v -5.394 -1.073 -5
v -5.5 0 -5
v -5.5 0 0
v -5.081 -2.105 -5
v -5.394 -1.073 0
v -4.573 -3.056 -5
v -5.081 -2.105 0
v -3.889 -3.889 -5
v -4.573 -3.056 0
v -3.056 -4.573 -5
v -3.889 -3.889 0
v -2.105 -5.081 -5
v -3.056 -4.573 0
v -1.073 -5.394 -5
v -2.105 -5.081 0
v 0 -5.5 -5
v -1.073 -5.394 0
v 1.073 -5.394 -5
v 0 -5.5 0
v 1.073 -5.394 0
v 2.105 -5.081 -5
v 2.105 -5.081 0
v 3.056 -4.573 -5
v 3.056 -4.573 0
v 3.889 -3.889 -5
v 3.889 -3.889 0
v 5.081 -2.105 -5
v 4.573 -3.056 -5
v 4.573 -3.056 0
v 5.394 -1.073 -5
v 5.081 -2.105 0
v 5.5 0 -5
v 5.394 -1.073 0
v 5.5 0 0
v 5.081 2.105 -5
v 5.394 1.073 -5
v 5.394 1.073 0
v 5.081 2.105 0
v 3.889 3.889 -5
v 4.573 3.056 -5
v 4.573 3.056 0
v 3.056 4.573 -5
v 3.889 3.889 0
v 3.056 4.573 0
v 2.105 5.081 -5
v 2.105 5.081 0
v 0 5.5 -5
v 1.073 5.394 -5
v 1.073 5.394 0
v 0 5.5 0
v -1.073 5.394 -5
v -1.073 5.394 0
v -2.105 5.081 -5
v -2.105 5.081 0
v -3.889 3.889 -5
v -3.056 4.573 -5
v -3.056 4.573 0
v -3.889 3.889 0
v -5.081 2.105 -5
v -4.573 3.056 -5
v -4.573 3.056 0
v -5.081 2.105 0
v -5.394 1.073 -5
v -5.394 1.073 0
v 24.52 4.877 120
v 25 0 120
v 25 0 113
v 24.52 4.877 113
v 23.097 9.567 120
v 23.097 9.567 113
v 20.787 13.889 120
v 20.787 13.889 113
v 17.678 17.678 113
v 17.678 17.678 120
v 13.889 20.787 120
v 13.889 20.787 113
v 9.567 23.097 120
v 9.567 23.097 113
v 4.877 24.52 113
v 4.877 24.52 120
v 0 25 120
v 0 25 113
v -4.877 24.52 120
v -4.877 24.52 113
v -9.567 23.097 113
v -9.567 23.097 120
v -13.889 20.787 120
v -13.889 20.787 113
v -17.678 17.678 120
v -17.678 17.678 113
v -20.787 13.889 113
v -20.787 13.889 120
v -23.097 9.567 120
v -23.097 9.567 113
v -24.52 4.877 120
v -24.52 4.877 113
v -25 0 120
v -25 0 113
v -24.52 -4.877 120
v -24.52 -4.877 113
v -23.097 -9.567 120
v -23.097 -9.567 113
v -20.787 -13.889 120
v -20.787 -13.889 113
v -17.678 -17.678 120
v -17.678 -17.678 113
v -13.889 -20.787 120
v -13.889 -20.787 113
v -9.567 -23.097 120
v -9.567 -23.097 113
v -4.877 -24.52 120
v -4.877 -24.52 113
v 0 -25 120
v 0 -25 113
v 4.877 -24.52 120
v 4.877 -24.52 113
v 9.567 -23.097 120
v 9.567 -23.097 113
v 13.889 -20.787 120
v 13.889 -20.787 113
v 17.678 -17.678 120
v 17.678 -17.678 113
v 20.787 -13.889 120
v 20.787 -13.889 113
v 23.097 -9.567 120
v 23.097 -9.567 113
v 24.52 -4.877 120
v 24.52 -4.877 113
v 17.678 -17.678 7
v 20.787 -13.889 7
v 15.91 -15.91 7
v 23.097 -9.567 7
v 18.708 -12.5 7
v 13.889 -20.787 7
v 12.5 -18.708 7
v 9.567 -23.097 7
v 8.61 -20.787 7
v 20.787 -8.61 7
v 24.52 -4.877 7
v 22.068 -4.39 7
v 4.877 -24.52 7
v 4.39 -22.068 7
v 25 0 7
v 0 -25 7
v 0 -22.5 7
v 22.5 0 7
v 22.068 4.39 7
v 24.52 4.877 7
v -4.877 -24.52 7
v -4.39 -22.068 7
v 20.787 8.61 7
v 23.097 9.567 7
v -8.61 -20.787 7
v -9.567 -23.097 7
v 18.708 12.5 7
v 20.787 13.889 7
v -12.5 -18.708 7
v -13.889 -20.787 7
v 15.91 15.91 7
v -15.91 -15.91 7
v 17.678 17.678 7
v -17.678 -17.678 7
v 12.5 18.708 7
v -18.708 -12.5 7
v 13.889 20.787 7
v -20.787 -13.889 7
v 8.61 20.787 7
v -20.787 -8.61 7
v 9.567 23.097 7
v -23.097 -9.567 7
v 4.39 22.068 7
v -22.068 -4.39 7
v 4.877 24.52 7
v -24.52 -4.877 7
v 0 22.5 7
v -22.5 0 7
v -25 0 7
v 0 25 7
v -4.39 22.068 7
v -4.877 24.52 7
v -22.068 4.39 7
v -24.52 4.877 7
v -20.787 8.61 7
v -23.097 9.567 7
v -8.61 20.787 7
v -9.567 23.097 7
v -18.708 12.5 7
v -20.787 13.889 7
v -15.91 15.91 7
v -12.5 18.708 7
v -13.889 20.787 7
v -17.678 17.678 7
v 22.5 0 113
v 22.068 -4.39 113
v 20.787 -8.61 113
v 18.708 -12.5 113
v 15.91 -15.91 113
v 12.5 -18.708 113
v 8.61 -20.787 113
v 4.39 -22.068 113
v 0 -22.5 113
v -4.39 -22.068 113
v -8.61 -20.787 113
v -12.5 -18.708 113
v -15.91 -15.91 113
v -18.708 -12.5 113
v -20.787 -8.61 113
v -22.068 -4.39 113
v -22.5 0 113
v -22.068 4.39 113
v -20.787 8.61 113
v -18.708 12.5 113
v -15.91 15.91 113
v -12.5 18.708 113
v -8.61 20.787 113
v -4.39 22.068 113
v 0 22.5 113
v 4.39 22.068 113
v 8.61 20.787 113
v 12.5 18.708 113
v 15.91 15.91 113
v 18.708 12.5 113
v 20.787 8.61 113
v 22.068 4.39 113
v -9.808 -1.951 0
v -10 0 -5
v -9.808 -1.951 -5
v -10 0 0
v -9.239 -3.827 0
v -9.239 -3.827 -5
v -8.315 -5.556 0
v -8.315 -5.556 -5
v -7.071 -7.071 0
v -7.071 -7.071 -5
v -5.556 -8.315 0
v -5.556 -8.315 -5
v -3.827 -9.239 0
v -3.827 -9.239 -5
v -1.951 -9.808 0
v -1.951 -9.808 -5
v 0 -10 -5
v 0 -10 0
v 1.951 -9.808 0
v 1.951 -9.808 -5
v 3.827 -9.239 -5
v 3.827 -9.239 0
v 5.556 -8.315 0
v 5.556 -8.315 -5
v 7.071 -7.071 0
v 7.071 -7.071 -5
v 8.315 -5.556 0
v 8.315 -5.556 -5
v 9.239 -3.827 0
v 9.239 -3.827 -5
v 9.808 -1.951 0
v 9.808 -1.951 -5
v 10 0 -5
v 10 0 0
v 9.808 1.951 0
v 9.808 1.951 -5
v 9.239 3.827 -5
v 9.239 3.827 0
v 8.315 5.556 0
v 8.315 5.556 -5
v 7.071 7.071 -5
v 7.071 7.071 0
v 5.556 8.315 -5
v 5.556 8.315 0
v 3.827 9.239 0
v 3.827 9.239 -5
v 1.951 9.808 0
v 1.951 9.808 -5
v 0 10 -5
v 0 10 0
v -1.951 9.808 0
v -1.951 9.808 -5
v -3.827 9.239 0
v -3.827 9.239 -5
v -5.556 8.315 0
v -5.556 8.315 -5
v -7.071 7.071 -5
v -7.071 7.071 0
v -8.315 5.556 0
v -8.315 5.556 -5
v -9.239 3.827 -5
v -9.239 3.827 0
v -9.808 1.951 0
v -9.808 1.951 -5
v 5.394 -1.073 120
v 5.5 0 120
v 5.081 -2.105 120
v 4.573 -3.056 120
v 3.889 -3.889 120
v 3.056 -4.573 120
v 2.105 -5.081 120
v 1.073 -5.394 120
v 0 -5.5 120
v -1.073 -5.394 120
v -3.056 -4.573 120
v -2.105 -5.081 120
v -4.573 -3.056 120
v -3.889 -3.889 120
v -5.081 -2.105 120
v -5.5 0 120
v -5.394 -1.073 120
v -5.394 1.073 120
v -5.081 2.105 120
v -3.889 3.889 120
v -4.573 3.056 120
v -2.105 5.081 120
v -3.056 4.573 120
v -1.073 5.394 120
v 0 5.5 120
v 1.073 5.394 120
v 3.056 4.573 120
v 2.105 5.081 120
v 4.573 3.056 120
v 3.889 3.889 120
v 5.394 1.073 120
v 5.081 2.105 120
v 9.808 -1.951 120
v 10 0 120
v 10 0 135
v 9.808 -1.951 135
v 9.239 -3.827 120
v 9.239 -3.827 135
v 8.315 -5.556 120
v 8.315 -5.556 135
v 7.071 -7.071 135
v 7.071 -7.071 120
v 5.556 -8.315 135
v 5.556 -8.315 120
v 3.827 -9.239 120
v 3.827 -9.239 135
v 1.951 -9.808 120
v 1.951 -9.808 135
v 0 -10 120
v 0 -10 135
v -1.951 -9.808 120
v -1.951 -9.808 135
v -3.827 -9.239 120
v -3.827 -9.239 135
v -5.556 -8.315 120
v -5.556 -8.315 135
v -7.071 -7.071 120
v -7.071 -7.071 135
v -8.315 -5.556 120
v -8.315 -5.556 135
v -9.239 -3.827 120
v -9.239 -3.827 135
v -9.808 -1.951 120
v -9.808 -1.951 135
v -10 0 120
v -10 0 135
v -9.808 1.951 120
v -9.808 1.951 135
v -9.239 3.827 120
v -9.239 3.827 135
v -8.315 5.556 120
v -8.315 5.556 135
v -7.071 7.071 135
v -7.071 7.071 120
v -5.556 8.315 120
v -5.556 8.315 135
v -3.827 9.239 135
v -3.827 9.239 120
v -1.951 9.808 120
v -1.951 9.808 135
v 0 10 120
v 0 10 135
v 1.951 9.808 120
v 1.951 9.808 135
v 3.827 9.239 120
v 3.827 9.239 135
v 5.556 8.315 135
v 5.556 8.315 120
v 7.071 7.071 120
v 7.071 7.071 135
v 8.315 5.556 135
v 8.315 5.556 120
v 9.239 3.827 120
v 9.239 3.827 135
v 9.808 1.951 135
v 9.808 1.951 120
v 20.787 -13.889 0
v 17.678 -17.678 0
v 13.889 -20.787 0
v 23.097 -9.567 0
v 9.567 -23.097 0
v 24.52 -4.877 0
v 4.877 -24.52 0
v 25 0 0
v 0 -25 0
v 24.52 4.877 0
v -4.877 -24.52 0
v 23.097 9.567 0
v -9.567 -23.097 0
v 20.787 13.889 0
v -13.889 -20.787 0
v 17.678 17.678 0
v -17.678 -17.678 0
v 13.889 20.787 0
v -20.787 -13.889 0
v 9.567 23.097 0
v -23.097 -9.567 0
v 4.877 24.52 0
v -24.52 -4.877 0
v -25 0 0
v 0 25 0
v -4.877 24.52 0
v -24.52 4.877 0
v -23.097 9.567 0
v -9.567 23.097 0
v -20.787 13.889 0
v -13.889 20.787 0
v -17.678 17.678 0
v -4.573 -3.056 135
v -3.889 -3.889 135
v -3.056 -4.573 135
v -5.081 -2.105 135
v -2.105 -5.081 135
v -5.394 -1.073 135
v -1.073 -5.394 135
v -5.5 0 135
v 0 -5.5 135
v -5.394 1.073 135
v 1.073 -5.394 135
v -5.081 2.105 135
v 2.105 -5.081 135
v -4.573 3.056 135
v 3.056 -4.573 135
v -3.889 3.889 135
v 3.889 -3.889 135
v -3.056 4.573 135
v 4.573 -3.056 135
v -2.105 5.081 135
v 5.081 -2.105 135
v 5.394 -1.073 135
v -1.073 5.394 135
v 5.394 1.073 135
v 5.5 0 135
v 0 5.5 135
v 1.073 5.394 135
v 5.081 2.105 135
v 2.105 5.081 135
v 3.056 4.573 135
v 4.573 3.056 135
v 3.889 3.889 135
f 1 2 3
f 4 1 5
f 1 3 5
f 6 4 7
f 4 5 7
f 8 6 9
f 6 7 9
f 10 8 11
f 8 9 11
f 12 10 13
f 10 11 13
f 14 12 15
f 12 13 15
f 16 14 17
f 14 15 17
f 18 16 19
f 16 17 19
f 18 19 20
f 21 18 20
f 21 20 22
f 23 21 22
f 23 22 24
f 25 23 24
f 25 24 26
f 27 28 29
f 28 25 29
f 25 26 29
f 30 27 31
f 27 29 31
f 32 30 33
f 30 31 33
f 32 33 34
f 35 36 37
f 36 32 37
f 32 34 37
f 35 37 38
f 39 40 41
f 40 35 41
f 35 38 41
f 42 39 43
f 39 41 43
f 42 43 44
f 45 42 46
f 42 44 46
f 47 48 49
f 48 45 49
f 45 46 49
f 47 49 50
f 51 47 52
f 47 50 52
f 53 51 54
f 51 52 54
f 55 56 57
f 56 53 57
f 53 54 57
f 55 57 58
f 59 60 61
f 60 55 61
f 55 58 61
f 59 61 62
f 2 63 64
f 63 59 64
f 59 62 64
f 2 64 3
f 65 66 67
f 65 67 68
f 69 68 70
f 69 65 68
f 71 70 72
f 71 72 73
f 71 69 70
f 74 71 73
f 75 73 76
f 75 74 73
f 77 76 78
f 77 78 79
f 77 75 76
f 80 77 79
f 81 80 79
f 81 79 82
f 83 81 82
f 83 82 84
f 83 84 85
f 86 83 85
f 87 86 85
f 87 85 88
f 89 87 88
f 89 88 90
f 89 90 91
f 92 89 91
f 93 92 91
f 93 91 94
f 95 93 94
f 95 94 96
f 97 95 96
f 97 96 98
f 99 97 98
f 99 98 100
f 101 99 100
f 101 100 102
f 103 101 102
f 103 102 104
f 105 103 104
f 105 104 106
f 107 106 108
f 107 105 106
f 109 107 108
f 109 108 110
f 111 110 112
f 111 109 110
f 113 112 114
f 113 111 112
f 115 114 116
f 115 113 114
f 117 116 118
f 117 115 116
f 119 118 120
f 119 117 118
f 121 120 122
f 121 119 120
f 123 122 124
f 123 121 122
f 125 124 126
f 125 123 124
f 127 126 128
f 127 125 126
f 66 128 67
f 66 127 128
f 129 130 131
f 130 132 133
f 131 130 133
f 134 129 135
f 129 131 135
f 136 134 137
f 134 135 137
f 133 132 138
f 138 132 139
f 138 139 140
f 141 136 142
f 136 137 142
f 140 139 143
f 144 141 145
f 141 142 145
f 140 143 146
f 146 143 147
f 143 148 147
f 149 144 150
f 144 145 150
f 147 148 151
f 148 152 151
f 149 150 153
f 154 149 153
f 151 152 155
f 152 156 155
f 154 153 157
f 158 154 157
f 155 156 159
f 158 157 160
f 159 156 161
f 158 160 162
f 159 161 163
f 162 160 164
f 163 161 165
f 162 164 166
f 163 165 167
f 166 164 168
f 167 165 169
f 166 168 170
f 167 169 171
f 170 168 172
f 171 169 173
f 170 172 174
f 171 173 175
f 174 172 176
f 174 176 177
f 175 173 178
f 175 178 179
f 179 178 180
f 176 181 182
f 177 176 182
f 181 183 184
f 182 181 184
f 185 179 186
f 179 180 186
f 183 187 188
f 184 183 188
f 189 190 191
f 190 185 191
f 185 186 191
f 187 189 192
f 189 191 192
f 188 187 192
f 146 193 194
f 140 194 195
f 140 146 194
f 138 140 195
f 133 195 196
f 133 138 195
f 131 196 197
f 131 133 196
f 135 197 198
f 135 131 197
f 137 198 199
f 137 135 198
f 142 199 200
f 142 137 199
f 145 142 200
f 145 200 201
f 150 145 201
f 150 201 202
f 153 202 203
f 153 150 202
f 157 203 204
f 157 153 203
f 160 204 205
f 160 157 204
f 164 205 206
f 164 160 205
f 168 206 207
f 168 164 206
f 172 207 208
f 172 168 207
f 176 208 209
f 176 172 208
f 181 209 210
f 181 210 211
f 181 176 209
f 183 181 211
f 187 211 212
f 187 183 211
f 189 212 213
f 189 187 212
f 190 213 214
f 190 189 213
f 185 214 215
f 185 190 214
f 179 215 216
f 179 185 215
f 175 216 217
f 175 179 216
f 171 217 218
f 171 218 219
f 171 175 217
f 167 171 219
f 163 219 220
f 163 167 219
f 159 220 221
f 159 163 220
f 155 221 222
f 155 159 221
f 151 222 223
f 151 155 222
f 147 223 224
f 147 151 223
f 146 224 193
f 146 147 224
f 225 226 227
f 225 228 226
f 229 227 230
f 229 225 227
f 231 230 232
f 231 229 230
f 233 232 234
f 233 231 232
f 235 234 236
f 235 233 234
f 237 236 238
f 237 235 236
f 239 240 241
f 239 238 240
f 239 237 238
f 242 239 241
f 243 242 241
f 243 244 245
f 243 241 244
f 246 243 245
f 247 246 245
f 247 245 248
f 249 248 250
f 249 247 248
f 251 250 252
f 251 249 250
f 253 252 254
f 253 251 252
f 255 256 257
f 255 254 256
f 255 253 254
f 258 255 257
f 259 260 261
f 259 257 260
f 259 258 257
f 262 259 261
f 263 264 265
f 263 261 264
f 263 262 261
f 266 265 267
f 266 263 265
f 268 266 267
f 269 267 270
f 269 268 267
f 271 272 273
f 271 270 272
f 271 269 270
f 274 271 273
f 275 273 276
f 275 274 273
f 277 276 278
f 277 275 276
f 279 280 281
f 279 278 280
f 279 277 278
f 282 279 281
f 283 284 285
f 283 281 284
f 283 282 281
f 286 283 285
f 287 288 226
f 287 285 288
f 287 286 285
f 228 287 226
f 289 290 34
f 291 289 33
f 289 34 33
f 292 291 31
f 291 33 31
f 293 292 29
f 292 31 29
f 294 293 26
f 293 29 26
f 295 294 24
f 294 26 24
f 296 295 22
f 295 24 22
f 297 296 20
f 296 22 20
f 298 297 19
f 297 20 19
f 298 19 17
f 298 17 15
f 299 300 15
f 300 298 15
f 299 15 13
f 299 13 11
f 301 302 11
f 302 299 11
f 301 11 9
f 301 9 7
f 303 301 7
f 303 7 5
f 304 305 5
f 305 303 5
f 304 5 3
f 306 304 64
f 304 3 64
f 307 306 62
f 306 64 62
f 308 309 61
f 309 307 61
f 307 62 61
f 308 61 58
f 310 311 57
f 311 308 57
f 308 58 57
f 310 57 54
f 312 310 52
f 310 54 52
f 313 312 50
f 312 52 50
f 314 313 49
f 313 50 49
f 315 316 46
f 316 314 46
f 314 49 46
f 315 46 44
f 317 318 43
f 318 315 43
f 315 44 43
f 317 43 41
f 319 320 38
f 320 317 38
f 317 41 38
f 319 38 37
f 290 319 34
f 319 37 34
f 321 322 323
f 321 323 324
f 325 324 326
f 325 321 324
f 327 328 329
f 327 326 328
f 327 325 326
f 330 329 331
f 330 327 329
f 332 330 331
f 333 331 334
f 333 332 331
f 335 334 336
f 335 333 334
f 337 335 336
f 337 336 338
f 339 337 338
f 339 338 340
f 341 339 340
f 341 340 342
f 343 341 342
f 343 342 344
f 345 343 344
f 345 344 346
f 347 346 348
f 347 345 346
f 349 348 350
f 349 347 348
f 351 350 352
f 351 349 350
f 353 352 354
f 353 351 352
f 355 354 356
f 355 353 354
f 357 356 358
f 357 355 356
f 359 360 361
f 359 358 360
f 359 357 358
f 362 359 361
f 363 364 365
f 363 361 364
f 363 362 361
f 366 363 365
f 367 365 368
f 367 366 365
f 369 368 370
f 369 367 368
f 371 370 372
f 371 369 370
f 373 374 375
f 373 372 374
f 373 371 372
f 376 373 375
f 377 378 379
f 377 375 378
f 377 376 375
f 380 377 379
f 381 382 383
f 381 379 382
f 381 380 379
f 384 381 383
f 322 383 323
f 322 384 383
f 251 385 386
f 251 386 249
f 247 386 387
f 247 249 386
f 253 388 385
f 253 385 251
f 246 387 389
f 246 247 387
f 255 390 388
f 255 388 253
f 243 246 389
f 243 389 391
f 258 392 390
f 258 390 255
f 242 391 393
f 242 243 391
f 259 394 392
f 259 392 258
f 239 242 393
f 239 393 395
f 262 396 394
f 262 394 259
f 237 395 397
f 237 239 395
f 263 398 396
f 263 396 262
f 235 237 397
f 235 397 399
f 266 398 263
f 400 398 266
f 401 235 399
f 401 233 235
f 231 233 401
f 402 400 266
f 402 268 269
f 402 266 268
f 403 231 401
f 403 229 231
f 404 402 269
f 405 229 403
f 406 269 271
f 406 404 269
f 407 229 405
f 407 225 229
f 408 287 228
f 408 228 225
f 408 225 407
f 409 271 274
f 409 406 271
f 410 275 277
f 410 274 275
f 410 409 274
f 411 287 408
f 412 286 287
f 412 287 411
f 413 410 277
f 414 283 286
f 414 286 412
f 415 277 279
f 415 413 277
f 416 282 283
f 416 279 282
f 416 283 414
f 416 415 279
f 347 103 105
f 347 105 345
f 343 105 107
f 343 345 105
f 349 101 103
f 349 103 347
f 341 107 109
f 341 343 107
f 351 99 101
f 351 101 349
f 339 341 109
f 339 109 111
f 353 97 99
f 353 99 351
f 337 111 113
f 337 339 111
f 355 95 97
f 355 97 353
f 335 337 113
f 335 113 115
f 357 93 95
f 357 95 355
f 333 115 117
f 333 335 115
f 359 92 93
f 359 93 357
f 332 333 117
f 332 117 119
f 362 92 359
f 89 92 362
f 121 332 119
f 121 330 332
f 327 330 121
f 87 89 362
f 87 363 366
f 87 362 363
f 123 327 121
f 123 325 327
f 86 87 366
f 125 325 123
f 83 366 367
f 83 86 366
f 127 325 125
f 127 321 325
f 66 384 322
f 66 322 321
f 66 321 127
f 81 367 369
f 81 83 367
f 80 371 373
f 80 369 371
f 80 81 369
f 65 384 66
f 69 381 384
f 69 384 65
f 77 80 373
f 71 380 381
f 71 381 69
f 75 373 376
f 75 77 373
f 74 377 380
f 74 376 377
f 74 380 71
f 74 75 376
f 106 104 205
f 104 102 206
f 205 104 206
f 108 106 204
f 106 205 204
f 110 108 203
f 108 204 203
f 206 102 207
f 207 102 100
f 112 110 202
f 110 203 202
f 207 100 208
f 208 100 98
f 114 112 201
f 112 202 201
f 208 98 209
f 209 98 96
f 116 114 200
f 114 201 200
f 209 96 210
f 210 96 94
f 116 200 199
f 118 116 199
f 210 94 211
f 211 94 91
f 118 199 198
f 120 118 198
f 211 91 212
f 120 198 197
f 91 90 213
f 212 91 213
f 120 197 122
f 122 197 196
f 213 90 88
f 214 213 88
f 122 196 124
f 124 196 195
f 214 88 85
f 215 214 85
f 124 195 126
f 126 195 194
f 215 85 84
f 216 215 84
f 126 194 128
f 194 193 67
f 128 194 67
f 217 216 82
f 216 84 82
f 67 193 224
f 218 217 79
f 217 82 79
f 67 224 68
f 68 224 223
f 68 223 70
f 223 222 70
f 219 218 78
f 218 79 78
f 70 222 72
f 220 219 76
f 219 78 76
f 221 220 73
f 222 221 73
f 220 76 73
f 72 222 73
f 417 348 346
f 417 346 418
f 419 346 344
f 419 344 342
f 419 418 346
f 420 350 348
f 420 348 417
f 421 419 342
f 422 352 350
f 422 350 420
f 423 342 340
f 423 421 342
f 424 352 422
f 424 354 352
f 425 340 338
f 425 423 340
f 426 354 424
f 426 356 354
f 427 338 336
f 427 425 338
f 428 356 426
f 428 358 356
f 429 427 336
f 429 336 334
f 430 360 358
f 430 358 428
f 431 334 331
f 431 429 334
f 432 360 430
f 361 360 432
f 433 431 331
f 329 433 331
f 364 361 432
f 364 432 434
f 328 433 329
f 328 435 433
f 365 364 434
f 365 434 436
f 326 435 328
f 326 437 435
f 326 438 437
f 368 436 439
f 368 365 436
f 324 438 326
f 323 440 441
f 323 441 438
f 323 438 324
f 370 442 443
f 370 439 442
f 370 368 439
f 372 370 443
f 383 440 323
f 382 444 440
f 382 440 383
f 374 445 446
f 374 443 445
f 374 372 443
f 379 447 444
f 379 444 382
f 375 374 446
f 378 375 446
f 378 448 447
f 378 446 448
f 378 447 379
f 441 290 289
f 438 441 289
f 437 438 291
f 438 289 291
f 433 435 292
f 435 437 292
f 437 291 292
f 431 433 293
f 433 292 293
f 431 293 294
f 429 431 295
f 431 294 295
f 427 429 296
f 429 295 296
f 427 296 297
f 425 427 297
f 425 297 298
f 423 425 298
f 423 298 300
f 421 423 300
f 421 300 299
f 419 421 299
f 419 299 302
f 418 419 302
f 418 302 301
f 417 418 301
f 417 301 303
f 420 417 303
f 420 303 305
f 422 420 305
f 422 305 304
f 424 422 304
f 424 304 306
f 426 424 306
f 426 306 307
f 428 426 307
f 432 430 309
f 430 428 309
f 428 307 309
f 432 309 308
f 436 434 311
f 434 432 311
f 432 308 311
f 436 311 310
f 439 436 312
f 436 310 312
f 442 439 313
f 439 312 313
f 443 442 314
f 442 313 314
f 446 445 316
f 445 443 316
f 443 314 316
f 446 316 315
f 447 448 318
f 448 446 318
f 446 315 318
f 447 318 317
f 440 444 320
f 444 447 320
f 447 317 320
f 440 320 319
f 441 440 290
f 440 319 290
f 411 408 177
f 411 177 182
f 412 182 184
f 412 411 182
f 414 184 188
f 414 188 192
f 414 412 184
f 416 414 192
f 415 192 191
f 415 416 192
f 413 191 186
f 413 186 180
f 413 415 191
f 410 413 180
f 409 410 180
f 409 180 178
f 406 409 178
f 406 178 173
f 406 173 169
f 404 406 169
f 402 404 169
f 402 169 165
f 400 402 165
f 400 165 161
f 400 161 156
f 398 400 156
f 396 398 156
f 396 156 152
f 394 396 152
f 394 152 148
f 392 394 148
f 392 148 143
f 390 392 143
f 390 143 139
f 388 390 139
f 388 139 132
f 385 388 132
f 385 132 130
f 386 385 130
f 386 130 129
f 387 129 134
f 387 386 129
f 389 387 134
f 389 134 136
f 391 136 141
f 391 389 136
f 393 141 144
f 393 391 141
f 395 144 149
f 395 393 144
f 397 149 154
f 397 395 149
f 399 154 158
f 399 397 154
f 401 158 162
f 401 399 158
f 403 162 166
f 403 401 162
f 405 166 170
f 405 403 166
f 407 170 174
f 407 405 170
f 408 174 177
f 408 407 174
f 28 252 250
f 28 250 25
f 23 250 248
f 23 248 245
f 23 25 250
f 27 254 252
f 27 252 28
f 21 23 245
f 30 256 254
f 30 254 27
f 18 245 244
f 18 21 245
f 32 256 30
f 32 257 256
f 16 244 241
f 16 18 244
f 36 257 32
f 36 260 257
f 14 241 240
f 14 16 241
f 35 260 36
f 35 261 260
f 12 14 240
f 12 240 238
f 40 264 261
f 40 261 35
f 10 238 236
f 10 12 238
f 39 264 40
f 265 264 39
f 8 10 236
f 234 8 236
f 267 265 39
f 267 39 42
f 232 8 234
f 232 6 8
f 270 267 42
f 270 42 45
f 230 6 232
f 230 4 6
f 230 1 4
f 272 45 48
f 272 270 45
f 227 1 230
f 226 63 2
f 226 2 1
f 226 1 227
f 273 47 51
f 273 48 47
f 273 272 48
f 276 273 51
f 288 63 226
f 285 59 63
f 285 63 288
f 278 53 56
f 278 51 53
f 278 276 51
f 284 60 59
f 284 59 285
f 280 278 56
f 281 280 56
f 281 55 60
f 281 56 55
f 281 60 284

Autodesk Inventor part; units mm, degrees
ref_plane "YZ Plane" through (0, 0, 0) normal (1, 0, 0) x (0, 1, 0)
ref_plane "XZ Plane" through (0, 0, 0) normal (0, 1, 0) x (-1, 0, 0)
ref_plane "XY Plane" through (0, 0, 0) normal (0, 0, 1) x (1, 0, 0)
sketch "Sketch1" plane through (0, 0, 0) normal (0, 0, 1) x (1, 0, 0)
  circle A0 centre (0, 0) radius 5.5
  circle A1 centre (0, 0) radius 22.5
  dimension "d0" = 11
  dimension "d1" = 45
extrude "Extrusion1" add sketch "Sketch1" along normal blind 120
sketch "Sketch2" plane through (0, 0, 120) normal (0, 0, 1) x (1, 0, 0)
  circle A0 centre (0, 0) radius 25
  circle A1 centre (0, 0) radius 5.5
  dimension "d4" = 50
  dimension "d5" = 11
extrude "Extrusion2" add sketch "Sketch2" against normal blind 7
sketch "Sketch3" plane through (0, 0, 0) normal (0, 0, -1) x (-1, 0, 0)
  circle A0 centre (0, 0) radius 5.5
  circle A1 centre (0, 0) radius 25
  dimension "d8" = 11
  dimension "d9" = 50
extrude "Extrusion3" add sketch "Sketch3" against normal blind 7
sketch "Sketch4" plane through (0, 0, 0) normal (0, 0, -1) x (-1, 0, 0)
  circle A0 centre (0, 0) radius 5.5
  circle A1 centre (0, 0) radius 10
  dimension "d12" = 20
extrude "Extrusion4" add sketch "Sketch4" along normal blind 5
sketch "Sketch5" plane through (0, 0, 120) normal (0, 0, 1) x (1, 0, 0)
  circle A0 centre (0, 0) radius 5.5
  circle A1 centre (0, 0) radius 10
  dimension "d15" = 20
extrude "Extrusion5" add sketch "Sketch5" along normal blind 15
properties part number "Ydre"
